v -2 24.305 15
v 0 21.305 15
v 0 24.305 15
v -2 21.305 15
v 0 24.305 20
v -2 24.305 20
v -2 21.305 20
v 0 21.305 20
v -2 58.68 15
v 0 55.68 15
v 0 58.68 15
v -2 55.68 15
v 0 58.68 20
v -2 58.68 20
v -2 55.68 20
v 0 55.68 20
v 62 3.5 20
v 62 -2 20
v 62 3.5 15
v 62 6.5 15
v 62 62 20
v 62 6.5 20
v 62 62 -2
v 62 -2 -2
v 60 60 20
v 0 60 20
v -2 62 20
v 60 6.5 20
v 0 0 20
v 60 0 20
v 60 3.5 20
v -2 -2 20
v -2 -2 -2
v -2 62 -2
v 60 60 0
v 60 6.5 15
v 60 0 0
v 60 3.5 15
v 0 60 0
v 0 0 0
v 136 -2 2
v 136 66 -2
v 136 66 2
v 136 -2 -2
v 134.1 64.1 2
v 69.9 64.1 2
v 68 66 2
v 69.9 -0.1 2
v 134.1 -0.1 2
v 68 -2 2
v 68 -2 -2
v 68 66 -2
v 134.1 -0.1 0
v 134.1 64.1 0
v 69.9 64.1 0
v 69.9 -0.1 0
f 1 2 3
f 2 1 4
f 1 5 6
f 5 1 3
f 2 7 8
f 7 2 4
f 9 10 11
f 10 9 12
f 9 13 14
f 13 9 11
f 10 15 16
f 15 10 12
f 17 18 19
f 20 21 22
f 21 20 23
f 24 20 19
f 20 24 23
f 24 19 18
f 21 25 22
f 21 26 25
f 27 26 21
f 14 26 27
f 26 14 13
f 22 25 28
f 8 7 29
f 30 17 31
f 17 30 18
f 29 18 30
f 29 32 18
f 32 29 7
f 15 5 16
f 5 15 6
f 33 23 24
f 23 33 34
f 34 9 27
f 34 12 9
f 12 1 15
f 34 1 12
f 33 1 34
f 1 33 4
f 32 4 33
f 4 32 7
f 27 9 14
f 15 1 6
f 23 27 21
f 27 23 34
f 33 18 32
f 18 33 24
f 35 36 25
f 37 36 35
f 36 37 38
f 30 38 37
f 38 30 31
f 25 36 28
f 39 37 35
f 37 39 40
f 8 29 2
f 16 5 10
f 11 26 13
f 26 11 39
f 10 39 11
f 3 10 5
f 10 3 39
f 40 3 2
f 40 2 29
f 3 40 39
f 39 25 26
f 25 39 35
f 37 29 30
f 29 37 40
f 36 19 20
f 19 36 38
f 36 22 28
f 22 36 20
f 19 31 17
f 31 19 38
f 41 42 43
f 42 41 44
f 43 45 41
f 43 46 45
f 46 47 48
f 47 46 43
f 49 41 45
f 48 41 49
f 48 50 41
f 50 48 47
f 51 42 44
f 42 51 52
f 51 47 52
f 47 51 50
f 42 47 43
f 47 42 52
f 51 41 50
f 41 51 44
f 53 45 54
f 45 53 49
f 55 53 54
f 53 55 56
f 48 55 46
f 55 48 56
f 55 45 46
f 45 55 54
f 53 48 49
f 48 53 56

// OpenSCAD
psuBoardWidth=60;
psuBoardHeight=60;
wallThickness=2;

portSize=6;
acLive=[2.65, 37.195];
acNeut=[2.65, 2.82];

dcOut=[55, 55];

cableM = 3;

function pcbToCaseX(pcb) = pcb;
function pcbToCaseY(pcb) = psuBoardHeight - pcb;

containerHeight=20;

difference() {
    translate([-wallThickness, -wallThickness, -wallThickness]) {
        cube([2 * wallThickness + psuBoardWidth, 2 * wallThickness + psuBoardHeight, wallThickness + containerHeight]);
    }
    cube([psuBoardWidth, psuBoardHeight, containerHeight + 0.01]);

    translate([-wallThickness - 0.01,0, containerHeight - cableM - wallThickness]) {
        translate([0, pcbToCaseY(acLive[1]) - cableM / 2, 0]) {
            cube([wallThickness + 0.02, cableM, cableM + wallThickness + 0.01]);
        }

        translate([0, pcbToCaseY(acNeut[1]) - cableM / 2, 0]) {
            cube([wallThickness + 0.02, cableM, cableM + wallThickness + 0.01]);
        }
    }

    translate([psuBoardWidth - 0.01,0, containerHeight - cableM - wallThickness]) {
        translate([0, pcbToCaseY(dcOut[1]) - cableM / 2, 0]) {
            cube([wallThickness + 0.02, cableM, cableM + wallThickness + 0.01]);
        }
        /*
        translate([0, (pcbToCaseY(coilHigh[1]) + pcbToCaseY(coilLow[1])) / 2 - cableM / 2, 0]) {
            cube([wallThickness + 0.02, cableM, cableM + wallThickness + 0.01]);
        }
        */
    }
}

translate([psuBoardWidth + 10, 0, 0]) {
    difference() {
        translate([-wallThickness, -wallThickness, -wallThickness]) {
            cube([4 * wallThickness + psuBoardWidth, 4 * wallThickness + psuBoardHeight, 2 * wallThickness]);
        }
        translate([-0.1, -0.1,0]) {
            cube([2 * wallThickness + psuBoardWidth + 0.2, 2 * wallThickness + psuBoardHeight + 0.2, wallThickness + 0.01]);
        }
    }
}
